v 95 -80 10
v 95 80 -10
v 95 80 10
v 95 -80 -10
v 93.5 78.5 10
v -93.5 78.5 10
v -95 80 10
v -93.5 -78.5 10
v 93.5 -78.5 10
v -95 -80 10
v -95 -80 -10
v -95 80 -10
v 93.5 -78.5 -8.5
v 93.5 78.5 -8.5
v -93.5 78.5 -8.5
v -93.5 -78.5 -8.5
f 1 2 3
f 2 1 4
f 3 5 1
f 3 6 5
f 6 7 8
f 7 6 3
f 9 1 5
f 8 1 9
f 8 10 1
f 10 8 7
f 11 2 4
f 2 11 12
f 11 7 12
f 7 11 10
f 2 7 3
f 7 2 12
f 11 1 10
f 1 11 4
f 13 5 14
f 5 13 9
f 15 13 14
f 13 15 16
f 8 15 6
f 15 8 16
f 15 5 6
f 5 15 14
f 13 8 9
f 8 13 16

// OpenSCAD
// ========================================
// a 190 x 160 x 20 mm enclosure with 1.5 mm wall thickness
// NeuroCAD canonical IR; dimensions are millimetres
// ========================================
$fn = 48;

difference() {
  cube(size=[190, 160, 20], center=true);
  translate([0, 0, 0.85]) {
    cube(size=[187, 157, 18.7], center=true);
  }
}
